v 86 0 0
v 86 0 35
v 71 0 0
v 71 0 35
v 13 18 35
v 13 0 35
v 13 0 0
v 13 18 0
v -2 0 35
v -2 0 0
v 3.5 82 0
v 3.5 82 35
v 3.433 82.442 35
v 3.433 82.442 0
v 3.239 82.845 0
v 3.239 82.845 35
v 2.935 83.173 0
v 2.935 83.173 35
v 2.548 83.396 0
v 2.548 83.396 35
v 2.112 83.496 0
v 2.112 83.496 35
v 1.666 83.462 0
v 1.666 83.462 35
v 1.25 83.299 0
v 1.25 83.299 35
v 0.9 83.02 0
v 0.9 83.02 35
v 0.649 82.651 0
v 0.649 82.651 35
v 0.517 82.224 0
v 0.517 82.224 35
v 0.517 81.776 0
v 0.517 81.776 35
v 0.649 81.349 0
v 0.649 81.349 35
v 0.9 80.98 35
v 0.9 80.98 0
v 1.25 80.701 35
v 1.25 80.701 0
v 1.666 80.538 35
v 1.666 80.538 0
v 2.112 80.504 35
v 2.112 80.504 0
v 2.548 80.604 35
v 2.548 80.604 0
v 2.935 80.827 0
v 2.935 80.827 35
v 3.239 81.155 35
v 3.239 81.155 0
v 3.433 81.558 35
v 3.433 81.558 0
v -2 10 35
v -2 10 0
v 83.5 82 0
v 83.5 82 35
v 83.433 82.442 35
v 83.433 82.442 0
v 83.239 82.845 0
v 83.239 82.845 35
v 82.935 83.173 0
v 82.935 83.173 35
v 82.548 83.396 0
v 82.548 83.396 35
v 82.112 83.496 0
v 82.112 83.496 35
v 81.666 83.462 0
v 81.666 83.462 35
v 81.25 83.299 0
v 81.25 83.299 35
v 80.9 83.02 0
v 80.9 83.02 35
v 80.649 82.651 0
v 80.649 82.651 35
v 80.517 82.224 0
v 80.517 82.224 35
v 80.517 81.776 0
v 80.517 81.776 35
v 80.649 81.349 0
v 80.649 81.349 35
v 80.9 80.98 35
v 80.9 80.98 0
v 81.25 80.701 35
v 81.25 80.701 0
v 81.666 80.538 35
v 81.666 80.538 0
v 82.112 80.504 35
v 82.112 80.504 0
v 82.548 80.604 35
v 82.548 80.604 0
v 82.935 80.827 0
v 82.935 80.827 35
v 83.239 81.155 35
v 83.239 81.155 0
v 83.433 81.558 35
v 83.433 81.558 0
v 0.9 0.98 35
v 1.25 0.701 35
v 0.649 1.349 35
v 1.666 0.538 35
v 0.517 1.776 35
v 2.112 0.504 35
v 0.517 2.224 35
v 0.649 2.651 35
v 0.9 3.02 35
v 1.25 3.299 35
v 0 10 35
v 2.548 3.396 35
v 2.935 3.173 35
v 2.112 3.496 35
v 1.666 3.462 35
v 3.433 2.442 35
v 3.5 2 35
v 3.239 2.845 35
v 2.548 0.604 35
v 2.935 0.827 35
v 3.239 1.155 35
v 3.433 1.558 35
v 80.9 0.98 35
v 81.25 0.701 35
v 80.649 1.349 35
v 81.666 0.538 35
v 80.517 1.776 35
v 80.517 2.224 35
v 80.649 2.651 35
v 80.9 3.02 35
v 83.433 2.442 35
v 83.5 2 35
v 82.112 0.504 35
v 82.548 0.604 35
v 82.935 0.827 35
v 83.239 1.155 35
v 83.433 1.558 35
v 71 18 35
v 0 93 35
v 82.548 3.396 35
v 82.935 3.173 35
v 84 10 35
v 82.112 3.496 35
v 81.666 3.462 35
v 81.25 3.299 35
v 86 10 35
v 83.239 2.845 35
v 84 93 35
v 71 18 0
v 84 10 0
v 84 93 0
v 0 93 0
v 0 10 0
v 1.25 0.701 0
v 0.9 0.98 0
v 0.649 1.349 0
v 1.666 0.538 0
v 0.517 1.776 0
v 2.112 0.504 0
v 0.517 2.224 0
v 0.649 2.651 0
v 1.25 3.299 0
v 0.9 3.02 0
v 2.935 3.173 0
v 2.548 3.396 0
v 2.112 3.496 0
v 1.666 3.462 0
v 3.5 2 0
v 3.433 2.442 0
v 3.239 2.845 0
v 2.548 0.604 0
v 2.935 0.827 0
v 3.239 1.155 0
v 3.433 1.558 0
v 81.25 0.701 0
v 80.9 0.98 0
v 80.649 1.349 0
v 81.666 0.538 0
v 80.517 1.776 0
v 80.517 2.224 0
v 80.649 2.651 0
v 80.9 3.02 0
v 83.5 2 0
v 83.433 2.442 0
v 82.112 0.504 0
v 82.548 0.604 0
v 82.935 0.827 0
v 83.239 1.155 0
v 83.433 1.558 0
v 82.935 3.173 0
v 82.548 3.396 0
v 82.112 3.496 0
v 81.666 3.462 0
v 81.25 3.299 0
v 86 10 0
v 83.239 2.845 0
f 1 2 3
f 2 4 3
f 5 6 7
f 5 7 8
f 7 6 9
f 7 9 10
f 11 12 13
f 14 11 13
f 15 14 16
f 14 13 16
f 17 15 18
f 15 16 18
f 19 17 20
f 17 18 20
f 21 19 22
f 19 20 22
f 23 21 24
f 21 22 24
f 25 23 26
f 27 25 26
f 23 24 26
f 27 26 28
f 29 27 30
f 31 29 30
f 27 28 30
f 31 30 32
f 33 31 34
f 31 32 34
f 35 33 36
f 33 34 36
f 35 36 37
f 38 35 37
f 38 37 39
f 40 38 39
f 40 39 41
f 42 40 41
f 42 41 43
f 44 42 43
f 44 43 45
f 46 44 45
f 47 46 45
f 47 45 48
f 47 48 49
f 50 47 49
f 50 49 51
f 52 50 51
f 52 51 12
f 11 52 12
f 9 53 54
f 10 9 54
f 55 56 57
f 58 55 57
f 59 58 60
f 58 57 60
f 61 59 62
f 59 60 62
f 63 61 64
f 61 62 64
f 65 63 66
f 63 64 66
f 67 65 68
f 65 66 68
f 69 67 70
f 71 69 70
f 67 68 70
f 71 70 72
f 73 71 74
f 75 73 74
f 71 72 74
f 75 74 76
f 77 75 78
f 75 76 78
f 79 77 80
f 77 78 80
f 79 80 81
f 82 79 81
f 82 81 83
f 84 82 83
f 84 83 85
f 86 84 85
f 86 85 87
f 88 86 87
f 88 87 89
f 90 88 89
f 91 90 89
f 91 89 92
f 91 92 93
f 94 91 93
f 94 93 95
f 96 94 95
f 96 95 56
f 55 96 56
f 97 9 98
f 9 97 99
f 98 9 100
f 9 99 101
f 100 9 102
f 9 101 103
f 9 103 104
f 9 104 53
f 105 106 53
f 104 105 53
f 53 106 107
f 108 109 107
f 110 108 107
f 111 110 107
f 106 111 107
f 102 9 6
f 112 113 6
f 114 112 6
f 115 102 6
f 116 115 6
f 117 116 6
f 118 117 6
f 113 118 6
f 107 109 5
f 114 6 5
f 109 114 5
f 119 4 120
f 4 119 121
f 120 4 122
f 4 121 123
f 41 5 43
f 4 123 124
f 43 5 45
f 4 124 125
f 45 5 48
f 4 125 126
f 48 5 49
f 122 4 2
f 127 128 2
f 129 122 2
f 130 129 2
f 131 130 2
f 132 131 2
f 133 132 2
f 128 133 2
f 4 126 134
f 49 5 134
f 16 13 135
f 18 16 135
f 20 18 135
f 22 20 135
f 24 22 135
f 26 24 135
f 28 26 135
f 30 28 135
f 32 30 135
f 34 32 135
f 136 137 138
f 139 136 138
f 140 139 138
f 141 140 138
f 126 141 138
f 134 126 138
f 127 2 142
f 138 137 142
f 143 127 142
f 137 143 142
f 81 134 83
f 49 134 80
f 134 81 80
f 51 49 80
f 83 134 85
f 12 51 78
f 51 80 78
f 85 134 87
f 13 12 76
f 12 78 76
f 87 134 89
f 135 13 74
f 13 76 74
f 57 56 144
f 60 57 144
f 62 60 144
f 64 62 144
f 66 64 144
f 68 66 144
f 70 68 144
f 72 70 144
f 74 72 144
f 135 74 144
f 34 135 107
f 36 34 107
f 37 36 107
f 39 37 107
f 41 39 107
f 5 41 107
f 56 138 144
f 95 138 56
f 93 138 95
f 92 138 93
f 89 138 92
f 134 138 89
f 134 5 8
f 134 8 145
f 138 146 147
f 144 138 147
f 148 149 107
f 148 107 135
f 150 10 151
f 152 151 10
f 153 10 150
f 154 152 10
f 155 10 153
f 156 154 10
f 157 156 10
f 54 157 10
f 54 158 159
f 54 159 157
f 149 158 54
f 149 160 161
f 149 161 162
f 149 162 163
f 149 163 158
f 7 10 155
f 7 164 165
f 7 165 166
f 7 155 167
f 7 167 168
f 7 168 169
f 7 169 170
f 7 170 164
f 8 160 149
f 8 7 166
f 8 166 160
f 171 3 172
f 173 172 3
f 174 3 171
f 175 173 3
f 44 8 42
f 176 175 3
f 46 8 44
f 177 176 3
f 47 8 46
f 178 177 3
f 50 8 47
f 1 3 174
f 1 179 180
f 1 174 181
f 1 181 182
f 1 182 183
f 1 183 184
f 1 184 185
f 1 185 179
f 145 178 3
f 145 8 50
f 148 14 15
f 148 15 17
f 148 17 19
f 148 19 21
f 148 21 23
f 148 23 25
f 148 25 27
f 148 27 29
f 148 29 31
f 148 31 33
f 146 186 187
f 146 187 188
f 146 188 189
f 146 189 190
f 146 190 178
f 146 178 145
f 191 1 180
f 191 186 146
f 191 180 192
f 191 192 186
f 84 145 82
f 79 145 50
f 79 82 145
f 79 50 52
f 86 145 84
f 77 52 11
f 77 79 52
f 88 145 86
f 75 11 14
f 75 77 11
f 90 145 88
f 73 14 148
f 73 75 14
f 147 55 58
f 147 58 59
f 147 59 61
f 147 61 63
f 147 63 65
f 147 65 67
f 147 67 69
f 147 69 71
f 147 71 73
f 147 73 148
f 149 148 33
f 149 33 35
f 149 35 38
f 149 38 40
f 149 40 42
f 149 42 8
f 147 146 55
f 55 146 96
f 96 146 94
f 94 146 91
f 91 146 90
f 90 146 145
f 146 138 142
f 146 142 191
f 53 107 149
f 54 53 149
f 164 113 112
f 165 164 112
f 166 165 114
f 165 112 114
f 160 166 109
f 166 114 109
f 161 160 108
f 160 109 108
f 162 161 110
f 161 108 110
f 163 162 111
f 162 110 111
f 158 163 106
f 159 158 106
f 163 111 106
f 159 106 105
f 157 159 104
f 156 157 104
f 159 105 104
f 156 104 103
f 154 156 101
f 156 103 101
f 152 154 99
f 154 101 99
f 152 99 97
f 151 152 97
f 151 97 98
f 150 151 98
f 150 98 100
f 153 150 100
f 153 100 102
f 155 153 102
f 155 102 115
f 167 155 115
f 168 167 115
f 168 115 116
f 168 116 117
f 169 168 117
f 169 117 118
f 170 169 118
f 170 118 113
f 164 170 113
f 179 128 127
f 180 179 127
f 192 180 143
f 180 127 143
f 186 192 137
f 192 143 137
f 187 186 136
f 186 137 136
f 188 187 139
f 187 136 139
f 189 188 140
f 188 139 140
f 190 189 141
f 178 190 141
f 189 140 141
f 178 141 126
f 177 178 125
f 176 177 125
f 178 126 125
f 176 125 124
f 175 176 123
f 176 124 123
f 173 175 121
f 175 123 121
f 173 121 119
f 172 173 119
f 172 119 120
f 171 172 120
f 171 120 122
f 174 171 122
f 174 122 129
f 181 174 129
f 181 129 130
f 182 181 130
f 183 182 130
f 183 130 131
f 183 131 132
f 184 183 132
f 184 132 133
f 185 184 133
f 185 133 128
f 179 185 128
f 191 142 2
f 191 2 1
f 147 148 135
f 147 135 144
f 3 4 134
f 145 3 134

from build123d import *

# Parameters (mm, degrees)
SKETCH_1_W          = 84
SKETCH_1_H          = 93
EXTRUDE_1_DEPTH     = 35
CUT_EXTRUDE_1_REACH = 132.115
SKETCH_2_R          = 1.5
CUT_EXTRUDE_2_REACH = 132.115
SKETCH_3_W          = 58
SKETCH_3_H          = 18
SKETCH_6_W          = 35
SKETCH_6_H          = 10
EXTRUDE_3_DEPTH     = 2


with BuildPart() as part:
    # 草图1 → 凸台-拉伸1 (new body)
    with BuildSketch(Plane.XY):
        with Locations((42, 46.5)):
            Rectangle(SKETCH_1_W, SKETCH_1_H)
    extrude(amount=EXTRUDE_1_DEPTH)

    # 草图2 → 切除-拉伸1 (cut, up to next)
    with BuildSketch(Plane.XY.offset(35), mode=Mode.PRIVATE) as cut_extrude_1_sk1:
        with Locations((82, 2)):
            Circle(SKETCH_2_R)
    cut_extrude_1_tool1 = extrude(cut_extrude_1_sk1.sketch, amount=-CUT_EXTRUDE_1_REACH, mode=Mode.PRIVATE) & part.part
    # 草图2 → 切除-拉伸1 (cut, up to next)
    with BuildSketch(Plane.XY.offset(35), mode=Mode.PRIVATE) as cut_extrude_1_sk2:
        with Locations((2, 2)):
            Circle(SKETCH_2_R)
    cut_extrude_1_tool2 = extrude(cut_extrude_1_sk2.sketch, amount=-CUT_EXTRUDE_1_REACH, mode=Mode.PRIVATE) & part.part
    # 草图2 → 切除-拉伸1 (cut, up to next)
    with BuildSketch(Plane.XY.offset(35), mode=Mode.PRIVATE) as cut_extrude_1_sk3:
        with Locations((82, 82)):
            Circle(SKETCH_2_R)
    cut_extrude_1_tool3 = extrude(cut_extrude_1_sk3.sketch, amount=-CUT_EXTRUDE_1_REACH, mode=Mode.PRIVATE) & part.part
    # 草图2 → 切除-拉伸1 (cut, up to next)
    with BuildSketch(Plane.XY.offset(35), mode=Mode.PRIVATE) as cut_extrude_1_sk4:
        with Locations((2, 82)):
            Circle(SKETCH_2_R)
    cut_extrude_1_tool4 = extrude(cut_extrude_1_sk4.sketch, amount=-CUT_EXTRUDE_1_REACH, mode=Mode.PRIVATE) & part.part
    add(cut_extrude_1_tool1.solids().sort_by_distance((82, 2, 35))[0], mode=Mode.SUBTRACT)
    add(cut_extrude_1_tool2.solids().sort_by_distance((2, 2, 35))[0], mode=Mode.SUBTRACT)
    add(cut_extrude_1_tool3.solids().sort_by_distance((82, 82, 35))[0], mode=Mode.SUBTRACT)
    add(cut_extrude_1_tool4.solids().sort_by_distance((2, 82, 35))[0], mode=Mode.SUBTRACT)

    # 草图3 → 切除-拉伸2 (cut, up to next)
    with BuildSketch(Plane.XY.offset(35), mode=Mode.PRIVATE) as cut_extrude_2_sk1:
        with Locations((42, 9)):
            Rectangle(SKETCH_3_W, SKETCH_3_H)
    cut_extrude_2_tool1 = extrude(cut_extrude_2_sk1.sketch, amount=-CUT_EXTRUDE_2_REACH, mode=Mode.PRIVATE) & part.part
    add(cut_extrude_2_tool1.solids().sort_by_distance((42, 9, 35))[0], mode=Mode.SUBTRACT)

    # 草图6 → 凸台-拉伸3 (add)
    with BuildSketch(Plane(origin=(84, 0, 0), x_dir=(0, 0, -1), z_dir=(1, 0, 0))):
        with Locations((-17.5, 5)):
            Rectangle(SKETCH_6_W, SKETCH_6_H)
    extrude_3 = extrude(amount=EXTRUDE_3_DEPTH)

    # 镜向1: 凸台-拉伸3 across plane
    add(extrude_3.mirror(Plane(origin=(42, 0, 0), x_dir=(0, 0, 1), z_dir=(1, 0, 0))))


solid = part.part
